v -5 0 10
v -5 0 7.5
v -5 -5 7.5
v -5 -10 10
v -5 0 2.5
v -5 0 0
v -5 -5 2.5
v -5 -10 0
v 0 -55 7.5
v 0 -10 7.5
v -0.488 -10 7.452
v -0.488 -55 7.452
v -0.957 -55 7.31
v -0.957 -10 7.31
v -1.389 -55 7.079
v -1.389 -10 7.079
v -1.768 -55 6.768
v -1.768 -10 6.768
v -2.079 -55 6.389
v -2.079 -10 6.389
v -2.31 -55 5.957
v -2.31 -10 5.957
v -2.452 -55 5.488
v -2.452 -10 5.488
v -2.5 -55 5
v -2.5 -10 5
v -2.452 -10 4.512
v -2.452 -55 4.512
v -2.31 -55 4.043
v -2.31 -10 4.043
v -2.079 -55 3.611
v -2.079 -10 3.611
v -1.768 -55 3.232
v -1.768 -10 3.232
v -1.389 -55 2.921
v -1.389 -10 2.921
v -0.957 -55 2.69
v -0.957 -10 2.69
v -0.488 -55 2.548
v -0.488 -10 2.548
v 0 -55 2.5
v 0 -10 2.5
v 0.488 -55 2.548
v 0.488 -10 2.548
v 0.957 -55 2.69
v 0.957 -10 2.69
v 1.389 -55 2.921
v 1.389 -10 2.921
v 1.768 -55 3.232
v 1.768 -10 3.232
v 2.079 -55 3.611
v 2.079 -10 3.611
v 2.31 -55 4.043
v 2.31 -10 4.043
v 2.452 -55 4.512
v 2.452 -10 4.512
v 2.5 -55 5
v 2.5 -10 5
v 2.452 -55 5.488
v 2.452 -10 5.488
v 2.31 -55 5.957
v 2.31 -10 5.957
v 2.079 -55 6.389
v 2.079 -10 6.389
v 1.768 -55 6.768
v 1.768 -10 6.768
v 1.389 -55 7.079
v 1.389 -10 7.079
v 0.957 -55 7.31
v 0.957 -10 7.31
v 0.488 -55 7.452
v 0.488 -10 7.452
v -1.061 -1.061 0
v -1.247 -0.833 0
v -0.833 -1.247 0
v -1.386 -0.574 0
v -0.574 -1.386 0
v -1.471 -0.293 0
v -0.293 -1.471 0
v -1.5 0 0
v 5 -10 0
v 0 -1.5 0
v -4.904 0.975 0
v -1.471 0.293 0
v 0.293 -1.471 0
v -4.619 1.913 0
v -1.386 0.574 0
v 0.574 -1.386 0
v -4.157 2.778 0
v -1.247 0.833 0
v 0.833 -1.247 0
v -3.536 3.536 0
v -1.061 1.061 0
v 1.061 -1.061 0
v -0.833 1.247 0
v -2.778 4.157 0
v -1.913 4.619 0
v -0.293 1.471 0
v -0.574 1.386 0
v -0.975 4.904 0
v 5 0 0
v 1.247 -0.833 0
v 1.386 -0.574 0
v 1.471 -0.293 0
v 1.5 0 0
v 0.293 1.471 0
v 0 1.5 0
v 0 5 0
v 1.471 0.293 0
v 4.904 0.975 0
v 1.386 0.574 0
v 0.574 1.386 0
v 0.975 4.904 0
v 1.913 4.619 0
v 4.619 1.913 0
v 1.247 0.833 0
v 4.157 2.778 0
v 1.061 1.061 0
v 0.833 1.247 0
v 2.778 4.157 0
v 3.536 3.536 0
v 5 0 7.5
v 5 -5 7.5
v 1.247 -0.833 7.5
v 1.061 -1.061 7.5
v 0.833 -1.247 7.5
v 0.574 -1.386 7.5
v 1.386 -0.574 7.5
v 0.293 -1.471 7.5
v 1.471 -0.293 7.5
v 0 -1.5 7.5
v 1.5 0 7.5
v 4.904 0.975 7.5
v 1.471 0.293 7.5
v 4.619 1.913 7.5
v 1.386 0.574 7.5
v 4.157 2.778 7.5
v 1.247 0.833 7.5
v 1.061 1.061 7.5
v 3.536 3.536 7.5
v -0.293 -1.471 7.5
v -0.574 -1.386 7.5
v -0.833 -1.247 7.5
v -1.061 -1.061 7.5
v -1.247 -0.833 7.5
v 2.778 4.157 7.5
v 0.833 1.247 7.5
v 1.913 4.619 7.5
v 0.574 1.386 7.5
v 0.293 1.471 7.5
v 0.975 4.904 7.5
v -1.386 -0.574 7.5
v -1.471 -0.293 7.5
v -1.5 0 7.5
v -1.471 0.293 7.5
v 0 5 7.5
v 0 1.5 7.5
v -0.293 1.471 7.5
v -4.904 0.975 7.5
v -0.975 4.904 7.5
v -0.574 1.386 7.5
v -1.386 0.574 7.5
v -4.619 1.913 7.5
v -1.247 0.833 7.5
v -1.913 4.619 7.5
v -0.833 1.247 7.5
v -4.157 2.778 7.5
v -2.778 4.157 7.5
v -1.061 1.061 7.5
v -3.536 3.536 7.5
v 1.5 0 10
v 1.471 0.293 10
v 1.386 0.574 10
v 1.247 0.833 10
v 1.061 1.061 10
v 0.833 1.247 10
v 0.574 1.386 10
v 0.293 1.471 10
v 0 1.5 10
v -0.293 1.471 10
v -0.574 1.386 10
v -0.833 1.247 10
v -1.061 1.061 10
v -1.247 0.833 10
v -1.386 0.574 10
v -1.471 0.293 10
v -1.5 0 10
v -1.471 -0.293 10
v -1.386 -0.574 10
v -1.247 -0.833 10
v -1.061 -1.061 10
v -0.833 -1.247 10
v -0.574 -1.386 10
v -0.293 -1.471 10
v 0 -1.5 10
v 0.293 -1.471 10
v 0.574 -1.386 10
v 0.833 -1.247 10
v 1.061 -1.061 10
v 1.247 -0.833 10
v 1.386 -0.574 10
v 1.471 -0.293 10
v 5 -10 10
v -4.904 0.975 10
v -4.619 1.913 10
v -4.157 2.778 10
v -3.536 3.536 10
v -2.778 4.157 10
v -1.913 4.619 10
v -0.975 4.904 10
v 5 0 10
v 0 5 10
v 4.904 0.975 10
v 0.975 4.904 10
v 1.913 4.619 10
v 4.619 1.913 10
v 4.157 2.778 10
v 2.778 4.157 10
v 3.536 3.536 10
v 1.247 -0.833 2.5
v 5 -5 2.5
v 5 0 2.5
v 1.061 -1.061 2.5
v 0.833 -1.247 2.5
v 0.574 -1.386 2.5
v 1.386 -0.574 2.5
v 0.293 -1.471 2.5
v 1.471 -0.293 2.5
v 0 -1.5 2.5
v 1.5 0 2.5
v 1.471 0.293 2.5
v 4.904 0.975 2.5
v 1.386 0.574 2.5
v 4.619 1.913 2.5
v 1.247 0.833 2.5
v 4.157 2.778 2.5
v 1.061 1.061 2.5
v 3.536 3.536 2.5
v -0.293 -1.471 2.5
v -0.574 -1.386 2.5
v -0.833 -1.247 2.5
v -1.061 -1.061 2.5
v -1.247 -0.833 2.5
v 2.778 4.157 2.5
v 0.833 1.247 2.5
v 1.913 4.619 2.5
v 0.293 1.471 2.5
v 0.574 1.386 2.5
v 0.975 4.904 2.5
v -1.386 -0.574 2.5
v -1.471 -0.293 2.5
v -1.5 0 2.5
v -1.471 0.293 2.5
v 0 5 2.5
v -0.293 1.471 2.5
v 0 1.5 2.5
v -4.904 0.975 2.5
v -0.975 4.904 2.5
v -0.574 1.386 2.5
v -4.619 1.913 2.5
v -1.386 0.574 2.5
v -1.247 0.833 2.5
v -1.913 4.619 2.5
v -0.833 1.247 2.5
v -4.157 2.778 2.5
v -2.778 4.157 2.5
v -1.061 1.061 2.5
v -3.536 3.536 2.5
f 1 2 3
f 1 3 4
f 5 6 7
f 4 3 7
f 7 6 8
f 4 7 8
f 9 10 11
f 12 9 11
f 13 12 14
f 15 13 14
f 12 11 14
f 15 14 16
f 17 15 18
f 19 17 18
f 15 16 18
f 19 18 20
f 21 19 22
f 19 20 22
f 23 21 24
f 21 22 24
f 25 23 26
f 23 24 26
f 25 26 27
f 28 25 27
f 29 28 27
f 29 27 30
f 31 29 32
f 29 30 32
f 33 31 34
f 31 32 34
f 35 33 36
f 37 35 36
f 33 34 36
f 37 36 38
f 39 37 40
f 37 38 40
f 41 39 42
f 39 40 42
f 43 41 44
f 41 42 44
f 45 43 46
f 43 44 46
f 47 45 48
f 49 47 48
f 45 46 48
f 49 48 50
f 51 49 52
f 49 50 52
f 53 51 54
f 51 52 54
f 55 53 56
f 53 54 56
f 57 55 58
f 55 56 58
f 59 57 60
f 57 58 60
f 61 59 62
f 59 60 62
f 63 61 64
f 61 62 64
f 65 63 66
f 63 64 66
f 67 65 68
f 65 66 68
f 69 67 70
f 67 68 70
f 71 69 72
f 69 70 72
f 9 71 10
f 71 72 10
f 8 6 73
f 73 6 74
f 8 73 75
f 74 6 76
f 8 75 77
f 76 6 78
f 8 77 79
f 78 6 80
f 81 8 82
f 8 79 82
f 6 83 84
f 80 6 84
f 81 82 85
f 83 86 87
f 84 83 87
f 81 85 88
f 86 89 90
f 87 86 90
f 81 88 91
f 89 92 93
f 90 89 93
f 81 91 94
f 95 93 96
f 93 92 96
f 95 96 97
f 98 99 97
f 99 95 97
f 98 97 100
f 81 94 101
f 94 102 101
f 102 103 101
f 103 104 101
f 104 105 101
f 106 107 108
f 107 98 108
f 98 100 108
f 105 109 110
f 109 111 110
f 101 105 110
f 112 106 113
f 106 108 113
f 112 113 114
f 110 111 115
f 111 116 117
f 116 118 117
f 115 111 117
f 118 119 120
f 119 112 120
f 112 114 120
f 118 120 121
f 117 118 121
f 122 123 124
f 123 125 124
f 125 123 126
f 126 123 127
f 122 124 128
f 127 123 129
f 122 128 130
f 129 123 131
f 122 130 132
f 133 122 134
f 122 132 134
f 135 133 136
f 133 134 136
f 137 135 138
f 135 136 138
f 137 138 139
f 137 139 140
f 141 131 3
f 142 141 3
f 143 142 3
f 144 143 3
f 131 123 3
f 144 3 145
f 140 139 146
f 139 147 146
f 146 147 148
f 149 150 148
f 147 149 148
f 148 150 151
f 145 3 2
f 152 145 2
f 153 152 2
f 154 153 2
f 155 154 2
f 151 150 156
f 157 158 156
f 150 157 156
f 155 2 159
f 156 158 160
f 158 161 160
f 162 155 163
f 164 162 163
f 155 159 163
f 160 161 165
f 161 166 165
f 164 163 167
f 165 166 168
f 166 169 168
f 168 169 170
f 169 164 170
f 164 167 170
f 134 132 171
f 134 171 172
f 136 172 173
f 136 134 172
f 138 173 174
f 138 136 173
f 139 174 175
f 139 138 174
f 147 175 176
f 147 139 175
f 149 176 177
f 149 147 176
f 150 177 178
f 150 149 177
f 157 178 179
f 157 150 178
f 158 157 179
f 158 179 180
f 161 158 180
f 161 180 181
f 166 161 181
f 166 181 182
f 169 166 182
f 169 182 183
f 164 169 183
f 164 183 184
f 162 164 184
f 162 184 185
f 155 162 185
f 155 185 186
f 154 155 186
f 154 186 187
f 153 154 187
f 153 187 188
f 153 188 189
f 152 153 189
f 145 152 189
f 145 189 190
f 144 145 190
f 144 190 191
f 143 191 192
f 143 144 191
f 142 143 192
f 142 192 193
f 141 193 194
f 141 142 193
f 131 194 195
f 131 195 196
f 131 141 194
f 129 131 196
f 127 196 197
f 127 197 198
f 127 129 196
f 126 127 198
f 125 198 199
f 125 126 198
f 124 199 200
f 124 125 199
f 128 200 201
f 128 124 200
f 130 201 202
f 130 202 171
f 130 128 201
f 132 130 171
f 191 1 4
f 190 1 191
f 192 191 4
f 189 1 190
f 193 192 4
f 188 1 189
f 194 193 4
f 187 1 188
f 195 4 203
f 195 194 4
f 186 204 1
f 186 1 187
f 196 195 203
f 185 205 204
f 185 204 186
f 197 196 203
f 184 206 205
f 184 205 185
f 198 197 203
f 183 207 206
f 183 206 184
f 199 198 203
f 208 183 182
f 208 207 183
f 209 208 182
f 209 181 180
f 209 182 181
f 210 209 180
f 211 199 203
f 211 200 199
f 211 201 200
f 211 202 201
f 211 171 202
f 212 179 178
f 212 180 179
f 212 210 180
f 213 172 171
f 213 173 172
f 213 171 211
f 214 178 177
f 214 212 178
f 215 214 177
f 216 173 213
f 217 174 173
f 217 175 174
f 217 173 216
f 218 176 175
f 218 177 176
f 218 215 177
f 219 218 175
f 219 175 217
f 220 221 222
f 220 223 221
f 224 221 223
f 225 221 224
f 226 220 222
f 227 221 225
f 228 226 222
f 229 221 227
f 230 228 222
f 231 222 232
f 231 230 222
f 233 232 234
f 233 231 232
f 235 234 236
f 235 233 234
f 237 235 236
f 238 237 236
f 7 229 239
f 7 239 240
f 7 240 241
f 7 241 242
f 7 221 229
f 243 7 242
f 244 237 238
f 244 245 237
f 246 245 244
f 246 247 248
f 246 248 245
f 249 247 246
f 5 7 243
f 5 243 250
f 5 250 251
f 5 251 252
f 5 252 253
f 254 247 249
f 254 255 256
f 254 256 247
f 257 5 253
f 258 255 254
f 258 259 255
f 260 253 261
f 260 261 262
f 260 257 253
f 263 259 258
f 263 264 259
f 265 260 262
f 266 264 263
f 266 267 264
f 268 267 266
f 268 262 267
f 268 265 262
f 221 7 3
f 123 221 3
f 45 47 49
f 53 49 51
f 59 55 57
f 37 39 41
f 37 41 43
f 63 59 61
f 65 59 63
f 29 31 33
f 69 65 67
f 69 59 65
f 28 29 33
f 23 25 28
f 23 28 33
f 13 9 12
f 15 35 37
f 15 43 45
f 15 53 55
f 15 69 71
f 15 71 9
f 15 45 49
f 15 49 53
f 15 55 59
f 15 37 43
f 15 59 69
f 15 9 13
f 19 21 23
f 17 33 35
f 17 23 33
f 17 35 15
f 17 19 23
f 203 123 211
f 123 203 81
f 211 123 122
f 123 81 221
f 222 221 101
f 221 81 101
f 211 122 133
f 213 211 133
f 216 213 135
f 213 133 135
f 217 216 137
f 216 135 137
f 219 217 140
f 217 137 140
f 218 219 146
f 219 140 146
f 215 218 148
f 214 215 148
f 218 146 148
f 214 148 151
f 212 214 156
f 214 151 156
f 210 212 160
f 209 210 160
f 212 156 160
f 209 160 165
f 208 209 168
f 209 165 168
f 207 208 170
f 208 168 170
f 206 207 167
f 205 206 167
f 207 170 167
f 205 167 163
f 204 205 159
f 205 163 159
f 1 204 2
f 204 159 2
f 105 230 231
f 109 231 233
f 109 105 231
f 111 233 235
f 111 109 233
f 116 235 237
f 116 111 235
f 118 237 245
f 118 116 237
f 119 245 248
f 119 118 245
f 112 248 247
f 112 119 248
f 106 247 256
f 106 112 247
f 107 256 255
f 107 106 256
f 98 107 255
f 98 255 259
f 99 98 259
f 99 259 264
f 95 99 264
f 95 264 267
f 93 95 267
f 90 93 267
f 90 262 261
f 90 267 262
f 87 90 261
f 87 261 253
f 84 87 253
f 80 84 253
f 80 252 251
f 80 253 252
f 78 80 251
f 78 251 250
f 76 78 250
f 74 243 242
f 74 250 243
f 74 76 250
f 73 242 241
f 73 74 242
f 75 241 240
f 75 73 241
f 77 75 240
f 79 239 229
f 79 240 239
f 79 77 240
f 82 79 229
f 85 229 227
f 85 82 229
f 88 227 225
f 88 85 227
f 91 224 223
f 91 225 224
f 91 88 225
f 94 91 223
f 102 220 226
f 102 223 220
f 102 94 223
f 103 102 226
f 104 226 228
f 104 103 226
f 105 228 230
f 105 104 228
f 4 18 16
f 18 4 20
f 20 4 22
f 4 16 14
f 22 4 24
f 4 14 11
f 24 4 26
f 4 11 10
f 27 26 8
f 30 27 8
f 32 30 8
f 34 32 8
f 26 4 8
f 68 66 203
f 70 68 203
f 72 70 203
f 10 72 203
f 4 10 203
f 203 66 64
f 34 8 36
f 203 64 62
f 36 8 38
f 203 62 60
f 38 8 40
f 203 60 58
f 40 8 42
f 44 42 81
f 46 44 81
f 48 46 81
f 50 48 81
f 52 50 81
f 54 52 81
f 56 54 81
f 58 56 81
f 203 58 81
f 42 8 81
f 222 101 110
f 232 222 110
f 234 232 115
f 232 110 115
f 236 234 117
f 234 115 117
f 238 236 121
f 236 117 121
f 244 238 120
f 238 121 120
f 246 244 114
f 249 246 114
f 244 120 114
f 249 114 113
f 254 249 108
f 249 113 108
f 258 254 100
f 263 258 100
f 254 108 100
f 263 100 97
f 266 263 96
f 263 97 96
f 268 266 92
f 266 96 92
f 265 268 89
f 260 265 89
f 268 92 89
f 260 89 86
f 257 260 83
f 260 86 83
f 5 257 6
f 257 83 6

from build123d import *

# Parameters (mm, degrees)
CROQUIS1_R              = 1.5
SALIENTE_EXTRUIR1_DEPTH = 10
CROQUIS2_R              = 2.5
SALIENTE_EXTRUIR2_DEPTH = 45
CROQUIS3_W              = 5
CROQUIS3_H              = 10
CORTAR_EXTRUIR1_DEPTH   = 40


with BuildPart() as part:
    # Croquis1 → Saliente-Extruir1 (new body)
    with BuildSketch(Plane.XY):
        with BuildLine():
            Line((-5, 0), (-5, -10))
            Line((-5, -10), (5, -10))
            Line((5, -10), (5, 0))
            ThreePointArc((5, 0), (0, 5), (-5, 0))
        make_face()
        Circle(CROQUIS1_R, mode=Mode.SUBTRACT)
    extrude(amount=SALIENTE_EXTRUIR1_DEPTH)

    # Croquis2 → Saliente-Extruir2 (add)
    with BuildSketch(Plane.XZ.offset(10)):
        with Locations((0, 5)):
            Circle(CROQUIS2_R)
    extrude(amount=SALIENTE_EXTRUIR2_DEPTH)

    # Croquis3 → Cortar-Extruir1 (cut)
    with BuildSketch(Plane.ZY.offset(5)):
        with Locations((5, 0)):
            Rectangle(CROQUIS3_W, CROQUIS3_H)
    extrude(amount=-CORTAR_EXTRUIR1_DEPTH, mode=Mode.SUBTRACT)


solid = part.part
